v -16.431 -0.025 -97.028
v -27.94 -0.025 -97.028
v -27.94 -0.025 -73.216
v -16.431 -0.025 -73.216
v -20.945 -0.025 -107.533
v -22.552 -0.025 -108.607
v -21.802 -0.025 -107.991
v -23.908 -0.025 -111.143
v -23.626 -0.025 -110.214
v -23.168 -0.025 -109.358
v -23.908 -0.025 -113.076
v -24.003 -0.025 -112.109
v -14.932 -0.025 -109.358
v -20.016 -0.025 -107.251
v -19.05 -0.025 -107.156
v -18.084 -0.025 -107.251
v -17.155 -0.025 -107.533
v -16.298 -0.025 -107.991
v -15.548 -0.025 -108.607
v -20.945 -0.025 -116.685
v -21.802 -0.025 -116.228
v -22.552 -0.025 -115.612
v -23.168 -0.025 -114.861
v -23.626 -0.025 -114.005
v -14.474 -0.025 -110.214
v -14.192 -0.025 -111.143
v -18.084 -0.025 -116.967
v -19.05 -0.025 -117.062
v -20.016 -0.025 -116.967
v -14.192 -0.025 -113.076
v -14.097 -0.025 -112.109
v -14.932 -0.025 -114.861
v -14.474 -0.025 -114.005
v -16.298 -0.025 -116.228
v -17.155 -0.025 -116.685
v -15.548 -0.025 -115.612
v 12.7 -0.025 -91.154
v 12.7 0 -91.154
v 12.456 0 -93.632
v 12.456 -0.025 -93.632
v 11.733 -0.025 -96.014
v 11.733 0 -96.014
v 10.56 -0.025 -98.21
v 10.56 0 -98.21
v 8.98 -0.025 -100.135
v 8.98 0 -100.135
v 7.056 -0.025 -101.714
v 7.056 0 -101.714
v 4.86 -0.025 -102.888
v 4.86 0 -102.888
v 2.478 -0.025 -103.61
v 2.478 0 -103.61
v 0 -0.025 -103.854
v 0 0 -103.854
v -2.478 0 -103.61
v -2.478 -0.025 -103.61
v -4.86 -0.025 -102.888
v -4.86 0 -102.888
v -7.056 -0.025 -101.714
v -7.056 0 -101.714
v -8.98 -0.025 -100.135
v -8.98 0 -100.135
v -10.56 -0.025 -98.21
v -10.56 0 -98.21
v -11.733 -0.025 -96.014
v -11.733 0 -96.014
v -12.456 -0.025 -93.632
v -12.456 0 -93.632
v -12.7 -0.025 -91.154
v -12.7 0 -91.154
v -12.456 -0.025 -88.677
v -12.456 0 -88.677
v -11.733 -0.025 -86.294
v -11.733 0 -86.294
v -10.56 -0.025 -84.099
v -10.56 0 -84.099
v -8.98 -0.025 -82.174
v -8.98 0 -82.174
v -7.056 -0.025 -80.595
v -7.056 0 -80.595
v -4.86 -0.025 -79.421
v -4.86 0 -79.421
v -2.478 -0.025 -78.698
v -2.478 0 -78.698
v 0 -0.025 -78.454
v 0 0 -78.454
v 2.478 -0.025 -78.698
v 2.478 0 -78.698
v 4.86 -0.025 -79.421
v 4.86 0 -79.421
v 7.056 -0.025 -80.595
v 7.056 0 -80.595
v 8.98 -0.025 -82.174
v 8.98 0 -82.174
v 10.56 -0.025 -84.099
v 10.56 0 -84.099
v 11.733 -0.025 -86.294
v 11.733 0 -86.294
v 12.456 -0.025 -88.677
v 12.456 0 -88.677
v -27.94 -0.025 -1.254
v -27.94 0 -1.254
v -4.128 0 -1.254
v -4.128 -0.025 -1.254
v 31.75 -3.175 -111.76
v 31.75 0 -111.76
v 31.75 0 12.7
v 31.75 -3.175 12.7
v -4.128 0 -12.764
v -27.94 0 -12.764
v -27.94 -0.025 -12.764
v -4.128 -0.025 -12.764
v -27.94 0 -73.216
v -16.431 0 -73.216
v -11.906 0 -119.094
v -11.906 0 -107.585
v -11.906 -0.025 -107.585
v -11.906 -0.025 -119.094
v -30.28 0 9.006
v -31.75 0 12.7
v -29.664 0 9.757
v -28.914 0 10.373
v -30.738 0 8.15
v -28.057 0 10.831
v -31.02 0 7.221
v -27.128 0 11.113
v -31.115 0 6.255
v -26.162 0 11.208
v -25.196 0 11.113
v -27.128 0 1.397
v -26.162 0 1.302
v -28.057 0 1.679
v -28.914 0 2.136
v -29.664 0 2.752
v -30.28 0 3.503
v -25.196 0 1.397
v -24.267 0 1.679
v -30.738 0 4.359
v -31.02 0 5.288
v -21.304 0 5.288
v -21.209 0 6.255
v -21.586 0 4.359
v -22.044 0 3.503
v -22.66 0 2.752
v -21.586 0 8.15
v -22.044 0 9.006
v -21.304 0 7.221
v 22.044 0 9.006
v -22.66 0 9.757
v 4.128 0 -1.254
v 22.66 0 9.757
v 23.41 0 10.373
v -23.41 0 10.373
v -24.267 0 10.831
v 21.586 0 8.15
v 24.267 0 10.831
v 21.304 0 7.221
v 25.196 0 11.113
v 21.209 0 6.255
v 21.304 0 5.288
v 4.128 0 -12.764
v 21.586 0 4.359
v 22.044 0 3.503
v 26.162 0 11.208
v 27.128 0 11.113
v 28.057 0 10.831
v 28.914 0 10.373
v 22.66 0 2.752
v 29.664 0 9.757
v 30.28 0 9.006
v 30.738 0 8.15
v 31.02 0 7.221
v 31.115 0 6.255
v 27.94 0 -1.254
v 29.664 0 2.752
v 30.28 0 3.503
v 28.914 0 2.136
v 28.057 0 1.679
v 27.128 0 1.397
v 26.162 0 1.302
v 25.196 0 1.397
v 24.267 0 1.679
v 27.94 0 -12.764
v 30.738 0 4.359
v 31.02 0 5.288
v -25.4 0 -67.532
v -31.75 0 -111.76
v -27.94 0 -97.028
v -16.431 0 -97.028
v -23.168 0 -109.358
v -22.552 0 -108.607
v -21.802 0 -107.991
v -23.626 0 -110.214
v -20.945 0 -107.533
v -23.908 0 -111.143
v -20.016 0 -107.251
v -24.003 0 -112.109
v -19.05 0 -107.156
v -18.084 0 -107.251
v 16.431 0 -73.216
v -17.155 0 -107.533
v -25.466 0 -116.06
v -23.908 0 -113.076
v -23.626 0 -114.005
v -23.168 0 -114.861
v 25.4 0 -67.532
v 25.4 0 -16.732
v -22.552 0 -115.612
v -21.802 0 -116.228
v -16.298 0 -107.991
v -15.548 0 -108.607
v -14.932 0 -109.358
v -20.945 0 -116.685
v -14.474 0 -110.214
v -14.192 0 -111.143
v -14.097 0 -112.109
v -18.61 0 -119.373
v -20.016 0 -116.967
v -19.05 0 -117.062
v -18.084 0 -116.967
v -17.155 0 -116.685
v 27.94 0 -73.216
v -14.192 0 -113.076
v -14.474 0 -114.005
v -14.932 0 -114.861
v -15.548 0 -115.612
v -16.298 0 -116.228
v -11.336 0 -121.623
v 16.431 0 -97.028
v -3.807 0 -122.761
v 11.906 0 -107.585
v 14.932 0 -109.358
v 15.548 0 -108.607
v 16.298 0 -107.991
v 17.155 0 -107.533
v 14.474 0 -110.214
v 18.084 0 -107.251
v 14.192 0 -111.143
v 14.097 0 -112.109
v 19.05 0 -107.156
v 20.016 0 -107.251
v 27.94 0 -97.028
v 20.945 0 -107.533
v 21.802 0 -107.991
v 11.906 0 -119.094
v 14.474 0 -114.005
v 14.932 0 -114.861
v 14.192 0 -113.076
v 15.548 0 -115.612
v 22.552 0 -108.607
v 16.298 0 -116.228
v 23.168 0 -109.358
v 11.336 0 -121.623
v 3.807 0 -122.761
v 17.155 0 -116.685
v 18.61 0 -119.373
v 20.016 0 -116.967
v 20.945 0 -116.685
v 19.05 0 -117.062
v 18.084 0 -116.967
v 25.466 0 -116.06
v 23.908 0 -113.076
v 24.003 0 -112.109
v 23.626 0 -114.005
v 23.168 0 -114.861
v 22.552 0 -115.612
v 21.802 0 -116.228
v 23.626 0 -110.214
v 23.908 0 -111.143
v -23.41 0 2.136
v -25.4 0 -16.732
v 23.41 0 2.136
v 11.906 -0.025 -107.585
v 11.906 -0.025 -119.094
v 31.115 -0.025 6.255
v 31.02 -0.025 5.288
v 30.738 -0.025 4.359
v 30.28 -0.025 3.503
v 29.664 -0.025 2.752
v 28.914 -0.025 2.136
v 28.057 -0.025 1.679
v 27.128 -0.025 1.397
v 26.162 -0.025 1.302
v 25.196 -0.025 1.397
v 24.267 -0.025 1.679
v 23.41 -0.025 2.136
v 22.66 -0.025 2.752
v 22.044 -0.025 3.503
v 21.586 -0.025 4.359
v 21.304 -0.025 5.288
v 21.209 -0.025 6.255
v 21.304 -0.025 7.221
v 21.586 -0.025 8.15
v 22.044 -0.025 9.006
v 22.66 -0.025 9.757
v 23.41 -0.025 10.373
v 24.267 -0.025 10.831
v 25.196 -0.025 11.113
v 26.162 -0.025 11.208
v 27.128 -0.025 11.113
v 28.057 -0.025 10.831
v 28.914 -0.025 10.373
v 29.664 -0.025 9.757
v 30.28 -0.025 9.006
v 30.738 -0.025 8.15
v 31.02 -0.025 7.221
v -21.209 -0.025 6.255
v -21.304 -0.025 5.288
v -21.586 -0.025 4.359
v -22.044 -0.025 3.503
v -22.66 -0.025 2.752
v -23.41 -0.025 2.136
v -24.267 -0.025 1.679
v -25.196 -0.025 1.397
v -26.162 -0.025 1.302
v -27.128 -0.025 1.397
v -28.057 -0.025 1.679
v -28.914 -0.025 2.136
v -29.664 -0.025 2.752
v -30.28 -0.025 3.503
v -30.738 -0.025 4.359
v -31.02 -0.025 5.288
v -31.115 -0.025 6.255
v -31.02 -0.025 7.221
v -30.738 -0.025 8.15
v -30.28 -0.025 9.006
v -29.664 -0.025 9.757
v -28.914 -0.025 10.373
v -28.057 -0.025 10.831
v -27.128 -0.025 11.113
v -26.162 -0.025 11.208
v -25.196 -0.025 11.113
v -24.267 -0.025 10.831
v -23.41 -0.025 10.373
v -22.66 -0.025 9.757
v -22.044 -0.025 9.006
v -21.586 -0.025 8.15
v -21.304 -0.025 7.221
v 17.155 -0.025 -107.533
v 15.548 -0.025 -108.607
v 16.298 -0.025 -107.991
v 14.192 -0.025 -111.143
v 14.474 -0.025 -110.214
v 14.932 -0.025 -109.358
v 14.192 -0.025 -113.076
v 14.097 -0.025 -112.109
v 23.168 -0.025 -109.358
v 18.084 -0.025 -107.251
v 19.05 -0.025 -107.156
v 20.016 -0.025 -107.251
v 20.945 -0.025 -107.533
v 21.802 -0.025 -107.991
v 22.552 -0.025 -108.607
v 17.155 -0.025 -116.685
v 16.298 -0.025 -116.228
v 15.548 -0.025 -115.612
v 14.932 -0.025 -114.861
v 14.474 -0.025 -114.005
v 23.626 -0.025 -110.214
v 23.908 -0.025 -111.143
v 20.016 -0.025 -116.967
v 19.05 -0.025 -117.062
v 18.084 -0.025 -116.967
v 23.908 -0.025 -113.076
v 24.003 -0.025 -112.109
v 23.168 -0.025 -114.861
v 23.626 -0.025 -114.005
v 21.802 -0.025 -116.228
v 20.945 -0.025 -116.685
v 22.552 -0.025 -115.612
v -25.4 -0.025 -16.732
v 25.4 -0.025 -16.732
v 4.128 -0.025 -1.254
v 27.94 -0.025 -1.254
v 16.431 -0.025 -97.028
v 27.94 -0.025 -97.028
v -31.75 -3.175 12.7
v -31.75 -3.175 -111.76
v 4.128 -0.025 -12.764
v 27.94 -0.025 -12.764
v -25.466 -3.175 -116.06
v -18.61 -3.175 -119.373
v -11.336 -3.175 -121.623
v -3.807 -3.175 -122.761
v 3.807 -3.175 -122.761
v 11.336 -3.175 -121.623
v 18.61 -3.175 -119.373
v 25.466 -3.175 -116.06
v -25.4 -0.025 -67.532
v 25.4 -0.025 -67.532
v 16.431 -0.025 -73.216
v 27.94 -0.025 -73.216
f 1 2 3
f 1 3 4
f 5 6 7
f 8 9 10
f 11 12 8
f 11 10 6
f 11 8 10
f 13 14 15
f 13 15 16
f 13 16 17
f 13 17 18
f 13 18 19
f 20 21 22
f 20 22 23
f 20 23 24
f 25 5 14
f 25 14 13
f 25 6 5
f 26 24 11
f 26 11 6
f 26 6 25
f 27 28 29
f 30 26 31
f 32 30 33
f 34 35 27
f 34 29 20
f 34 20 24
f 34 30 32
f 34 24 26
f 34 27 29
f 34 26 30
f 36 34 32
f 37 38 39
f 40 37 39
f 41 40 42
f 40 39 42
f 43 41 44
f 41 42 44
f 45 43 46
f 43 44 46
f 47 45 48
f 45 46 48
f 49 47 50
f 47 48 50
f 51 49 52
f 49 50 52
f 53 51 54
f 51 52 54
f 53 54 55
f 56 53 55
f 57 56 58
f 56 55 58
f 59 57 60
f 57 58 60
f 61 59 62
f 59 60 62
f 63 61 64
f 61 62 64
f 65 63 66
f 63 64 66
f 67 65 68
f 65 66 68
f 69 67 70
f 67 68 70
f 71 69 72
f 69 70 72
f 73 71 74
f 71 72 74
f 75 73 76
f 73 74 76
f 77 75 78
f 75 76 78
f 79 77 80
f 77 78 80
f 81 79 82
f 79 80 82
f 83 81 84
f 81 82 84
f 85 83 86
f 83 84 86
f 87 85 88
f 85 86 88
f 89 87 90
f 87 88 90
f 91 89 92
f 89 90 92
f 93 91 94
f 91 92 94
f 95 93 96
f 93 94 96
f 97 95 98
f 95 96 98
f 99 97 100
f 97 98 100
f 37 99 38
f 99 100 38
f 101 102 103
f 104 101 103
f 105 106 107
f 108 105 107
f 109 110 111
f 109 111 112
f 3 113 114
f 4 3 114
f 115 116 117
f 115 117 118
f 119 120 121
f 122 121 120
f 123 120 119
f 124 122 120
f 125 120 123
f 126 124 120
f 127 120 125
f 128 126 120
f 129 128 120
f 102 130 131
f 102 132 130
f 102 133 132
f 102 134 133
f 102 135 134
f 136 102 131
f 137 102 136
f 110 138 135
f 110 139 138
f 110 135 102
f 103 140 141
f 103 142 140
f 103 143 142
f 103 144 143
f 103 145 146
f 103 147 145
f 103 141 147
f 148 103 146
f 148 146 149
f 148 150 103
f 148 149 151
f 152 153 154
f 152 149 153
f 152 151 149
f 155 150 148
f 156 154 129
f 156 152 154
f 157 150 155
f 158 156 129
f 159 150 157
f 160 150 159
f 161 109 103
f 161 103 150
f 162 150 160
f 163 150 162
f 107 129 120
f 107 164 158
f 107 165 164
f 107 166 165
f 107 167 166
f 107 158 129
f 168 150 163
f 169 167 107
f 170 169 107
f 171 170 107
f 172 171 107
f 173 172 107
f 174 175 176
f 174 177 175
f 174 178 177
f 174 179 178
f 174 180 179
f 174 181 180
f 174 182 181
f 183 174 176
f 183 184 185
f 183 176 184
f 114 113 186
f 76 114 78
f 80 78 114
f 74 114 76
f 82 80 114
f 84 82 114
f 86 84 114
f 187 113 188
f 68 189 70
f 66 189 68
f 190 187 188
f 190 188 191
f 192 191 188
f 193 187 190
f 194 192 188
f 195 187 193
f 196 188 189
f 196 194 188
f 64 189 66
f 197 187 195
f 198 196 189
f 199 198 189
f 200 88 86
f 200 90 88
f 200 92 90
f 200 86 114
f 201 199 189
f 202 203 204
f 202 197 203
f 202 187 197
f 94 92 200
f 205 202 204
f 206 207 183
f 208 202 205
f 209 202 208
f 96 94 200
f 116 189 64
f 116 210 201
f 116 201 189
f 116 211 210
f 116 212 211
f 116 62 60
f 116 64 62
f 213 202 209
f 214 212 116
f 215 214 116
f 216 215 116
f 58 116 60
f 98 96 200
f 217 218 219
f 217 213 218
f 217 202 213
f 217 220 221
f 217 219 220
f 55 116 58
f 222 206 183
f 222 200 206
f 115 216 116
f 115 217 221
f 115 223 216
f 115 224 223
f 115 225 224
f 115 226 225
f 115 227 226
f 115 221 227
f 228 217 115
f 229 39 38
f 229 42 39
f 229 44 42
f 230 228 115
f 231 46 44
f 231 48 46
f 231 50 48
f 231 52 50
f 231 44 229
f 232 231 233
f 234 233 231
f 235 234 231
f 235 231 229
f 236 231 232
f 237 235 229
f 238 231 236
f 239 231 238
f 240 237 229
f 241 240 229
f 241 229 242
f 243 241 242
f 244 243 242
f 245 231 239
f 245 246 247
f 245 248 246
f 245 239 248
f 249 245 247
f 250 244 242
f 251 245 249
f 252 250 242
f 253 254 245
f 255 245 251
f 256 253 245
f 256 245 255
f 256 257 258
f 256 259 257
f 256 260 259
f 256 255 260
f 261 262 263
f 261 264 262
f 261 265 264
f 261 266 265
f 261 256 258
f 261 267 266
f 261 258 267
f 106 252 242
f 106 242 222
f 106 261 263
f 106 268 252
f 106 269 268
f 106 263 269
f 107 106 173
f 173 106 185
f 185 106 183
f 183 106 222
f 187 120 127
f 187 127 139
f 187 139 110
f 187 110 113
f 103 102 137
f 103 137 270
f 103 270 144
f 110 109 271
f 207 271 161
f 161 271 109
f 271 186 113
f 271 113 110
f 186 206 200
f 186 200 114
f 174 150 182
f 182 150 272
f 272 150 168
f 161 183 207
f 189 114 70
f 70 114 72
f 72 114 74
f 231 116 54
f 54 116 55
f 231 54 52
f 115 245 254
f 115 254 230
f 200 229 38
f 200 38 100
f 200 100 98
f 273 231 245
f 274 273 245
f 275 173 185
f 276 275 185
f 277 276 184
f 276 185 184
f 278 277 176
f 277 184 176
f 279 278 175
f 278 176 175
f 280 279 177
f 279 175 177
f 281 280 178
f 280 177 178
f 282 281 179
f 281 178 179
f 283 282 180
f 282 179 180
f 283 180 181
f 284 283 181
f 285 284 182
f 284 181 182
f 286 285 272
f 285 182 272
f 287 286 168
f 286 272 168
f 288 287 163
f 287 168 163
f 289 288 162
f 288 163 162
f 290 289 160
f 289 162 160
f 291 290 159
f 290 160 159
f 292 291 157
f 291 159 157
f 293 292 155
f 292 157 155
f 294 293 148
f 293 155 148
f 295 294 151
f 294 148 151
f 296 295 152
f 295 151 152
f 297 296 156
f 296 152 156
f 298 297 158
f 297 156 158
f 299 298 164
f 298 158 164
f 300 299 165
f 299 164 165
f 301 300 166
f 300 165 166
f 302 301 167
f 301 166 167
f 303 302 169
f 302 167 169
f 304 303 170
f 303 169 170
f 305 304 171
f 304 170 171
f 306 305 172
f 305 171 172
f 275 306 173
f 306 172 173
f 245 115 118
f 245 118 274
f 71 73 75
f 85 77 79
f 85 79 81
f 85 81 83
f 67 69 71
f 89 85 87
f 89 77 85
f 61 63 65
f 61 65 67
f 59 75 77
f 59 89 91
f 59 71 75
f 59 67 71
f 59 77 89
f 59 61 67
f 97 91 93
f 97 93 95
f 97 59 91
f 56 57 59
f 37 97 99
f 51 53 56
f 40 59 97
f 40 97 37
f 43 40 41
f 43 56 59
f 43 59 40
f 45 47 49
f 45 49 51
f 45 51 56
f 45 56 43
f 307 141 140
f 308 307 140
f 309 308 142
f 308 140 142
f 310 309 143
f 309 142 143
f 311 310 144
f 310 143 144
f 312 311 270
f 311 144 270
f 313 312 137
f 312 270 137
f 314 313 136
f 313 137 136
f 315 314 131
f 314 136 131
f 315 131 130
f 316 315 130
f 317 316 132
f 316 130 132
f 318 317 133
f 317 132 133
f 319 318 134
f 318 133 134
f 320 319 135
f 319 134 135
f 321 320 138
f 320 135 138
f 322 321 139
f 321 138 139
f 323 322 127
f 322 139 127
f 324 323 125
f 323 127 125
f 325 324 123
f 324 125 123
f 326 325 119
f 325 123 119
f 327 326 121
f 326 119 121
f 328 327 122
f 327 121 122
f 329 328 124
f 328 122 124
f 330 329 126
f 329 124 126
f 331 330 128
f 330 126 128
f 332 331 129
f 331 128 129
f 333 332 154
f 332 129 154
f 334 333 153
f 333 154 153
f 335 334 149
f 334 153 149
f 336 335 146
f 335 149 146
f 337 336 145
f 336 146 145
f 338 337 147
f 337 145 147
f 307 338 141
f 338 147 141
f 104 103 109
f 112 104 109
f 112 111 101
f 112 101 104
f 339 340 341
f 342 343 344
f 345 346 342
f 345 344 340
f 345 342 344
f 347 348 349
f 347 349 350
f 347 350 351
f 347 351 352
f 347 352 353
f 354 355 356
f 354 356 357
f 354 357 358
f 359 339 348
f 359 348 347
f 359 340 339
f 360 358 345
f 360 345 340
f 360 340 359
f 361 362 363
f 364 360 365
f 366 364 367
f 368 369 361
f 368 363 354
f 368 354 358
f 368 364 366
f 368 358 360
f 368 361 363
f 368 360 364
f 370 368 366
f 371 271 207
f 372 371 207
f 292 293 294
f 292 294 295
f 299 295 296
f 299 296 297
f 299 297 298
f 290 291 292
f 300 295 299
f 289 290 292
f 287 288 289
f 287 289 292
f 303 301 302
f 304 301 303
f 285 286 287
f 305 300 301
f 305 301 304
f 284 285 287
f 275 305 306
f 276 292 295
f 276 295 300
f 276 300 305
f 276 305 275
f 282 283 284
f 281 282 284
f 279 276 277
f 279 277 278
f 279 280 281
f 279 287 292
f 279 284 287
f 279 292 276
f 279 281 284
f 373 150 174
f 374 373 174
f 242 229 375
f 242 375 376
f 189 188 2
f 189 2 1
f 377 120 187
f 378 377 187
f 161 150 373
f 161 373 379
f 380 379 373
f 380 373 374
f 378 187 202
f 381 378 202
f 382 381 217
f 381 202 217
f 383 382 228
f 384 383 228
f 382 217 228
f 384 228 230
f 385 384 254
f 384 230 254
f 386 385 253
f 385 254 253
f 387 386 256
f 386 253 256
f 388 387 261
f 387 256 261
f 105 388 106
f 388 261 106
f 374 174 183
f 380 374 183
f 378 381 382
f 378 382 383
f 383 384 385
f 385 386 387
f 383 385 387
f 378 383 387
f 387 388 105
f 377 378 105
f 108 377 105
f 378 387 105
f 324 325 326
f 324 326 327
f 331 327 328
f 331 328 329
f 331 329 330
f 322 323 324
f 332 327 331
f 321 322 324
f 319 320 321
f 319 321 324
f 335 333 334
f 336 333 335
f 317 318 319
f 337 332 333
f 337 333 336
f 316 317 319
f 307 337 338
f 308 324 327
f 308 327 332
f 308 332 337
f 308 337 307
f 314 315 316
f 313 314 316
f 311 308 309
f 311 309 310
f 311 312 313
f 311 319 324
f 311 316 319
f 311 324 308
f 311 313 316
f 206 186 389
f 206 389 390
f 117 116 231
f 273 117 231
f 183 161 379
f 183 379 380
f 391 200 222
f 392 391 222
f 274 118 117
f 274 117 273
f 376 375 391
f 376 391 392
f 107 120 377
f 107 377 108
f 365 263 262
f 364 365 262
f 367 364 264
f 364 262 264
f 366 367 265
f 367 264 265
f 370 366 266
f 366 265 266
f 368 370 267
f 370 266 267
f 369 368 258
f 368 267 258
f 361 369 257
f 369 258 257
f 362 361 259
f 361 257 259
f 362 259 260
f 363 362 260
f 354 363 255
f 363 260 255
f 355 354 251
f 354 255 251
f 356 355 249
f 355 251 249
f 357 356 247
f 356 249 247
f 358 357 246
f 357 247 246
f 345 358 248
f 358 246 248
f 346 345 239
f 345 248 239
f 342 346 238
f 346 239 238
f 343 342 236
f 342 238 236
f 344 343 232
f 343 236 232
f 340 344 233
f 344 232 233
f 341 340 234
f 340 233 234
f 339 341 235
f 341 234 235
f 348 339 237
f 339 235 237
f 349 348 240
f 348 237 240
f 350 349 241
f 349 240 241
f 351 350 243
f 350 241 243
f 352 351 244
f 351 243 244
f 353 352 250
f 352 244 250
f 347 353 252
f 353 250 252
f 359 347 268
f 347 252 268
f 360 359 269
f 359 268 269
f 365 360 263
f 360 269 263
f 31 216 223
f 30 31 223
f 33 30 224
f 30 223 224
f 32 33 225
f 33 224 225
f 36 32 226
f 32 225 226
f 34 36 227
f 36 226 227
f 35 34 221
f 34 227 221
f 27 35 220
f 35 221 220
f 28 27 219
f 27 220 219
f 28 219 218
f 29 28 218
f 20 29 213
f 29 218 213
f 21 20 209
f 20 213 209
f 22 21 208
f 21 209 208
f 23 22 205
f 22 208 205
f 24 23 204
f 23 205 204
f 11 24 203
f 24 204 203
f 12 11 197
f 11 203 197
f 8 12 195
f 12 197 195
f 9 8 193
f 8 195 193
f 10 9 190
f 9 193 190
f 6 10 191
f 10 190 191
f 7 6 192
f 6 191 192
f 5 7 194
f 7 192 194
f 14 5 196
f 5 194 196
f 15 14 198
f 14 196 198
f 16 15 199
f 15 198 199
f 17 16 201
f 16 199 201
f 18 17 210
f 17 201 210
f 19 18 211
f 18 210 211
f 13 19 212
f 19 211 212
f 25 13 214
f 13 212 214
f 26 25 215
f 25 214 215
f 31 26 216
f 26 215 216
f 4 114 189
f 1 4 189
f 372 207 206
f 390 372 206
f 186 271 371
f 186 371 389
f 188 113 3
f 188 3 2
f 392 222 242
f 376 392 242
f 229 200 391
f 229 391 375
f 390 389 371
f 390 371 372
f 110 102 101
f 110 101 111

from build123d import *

# Parameters (mm, degrees)
BOSS_EXTRUDE1_DEPTH = 12.7
BOSS_EXTRUDE2_DEPTH = 11.43
BOSS_EXTRUDE3_DEPTH = 3.175
SKETCH25_W          = 101.6
SKETCH25_H          = 203.2
CUT_EXTRUDE16_DEPTH = 26.4
SKETCH31_W          = 40.64
SKETCH31_H          = 12.7
BOSS_EXTRUDE5_DEPTH = 3.175
SKETCH27_R          = 4.953
SKETCH27_R_2        = 12.7
SKETCH27_W          = 50.8
SKETCH27_H          = 50.8
CUT_EXTRUDE17_DEPTH = 0.0254
SKETCH28_W          = 23.8125
SKETCH28_H          = 11.509375
SKETCH28_W_2        = 11.509375
SKETCH28_H_2        = 23.8125
CUT_EXTRUDE18_DEPTH = 0.0254


with BuildPart() as part:
    # Sketch1 → Boss-Extrude1 (new body)
    with BuildSketch(Plane(origin=(0, 0, 0), x_dir=(1, 0, 0), z_dir=(0, 1, 0))):
        with BuildLine():
            Line((-31.75, 0), (31.75, 0))
            Line((31.75, 0), (31.75, 111.76))
            ThreePointArc((31.75, 111.76), (0, 122.90426271), (-31.75, 111.76))
            Line((-31.75, 111.76), (-31.75, 0))
        make_face()
    extrude(amount=BOSS_EXTRUDE1_DEPTH)

    # Sketch2 → Boss-Extrude2 (add)
    with BuildSketch(Plane.ZY.offset(31.75)):
        with BuildLine():
            Line((0, 0), (12.7, 0))
            ThreePointArc((12.7, 0), (21.680256121, 21.680256121), (0, 12.7))
            Line((0, 12.7), (0, 0))
        make_face()
    boss_extrude2 = extrude(amount=-BOSS_EXTRUDE2_DEPTH)

    # Mirror1: Boss-Extrude2 across plane
    add(boss_extrude2.mirror(Plane(origin=(0, 0, 0), x_dir=(0, 0, 1), z_dir=(1, 0, 0))))

    # Sketch24 → Boss-Extrude3 (add)
    with BuildSketch(Plane.XZ):
        with BuildLine():
            Line((20.32, 0), (-20.32, 0))
            Line((-20.32, 0), (-20.32, 12.7))
            Line((-20.32, 12.7), (-31.75, 12.7))
            Line((-31.75, 12.7), (-31.75, -111.76))
            ThreePointArc((-31.75, -111.76), (0, -122.90426271), (31.75, -111.76))
            Line((31.75, -111.76), (31.75, 12.7))
            Line((31.75, 12.7), (20.32, 12.7))
            Line((20.32, 12.7), (20.32, 0))
        make_face()
    extrude(amount=BOSS_EXTRUDE3_DEPTH)

    # Sketch25 → Cut-Extrude16 (cut, through all)
    with BuildSketch(Plane(origin=(0, 0, 0), x_dir=(-1, 0, 0), z_dir=(0, -1, 0))):
        with Locations((12.008205385, 70.319547201)):
            Rectangle(SKETCH25_W, SKETCH25_H)
    extrude(amount=-CUT_EXTRUDE16_DEPTH, mode=Mode.SUBTRACT)

    # Sketch31 → Boss-Extrude5 (add)
    with BuildSketch(Plane(origin=(0, 0, 0), x_dir=(1, 0, 0), z_dir=(0, 1, 0))):
        with Locations((0, -6.35)):
            Rectangle(SKETCH31_W, SKETCH31_H)
    extrude(amount=-BOSS_EXTRUDE5_DEPTH)

    # Sketch27 → Cut-Extrude17 (cut)
    with BuildSketch(Plane(origin=(0, 0, 0), x_dir=(1, 0, 0), z_dir=(0, 1, 0))):
        with Locations((19.05, 112.10926271)):
            Circle(SKETCH27_R)
        with Locations((-19.05, 112.10926271)):
            Circle(SKETCH27_R)
        with Locations((26.162, -6.25473729)):
            Circle(SKETCH27_R)
        with Locations((-26.162, -6.25473729)):
            Circle(SKETCH27_R)
        with Locations((0, 91.15426271)):
            Circle(SKETCH27_R_2)
        with Locations((0, 42.13226271)):
            Rectangle(SKETCH27_W, SKETCH27_H)
    extrude(amount=-CUT_EXTRUDE17_DEPTH, mode=Mode.SUBTRACT)

    # Sketch28 → Cut-Extrude18 (cut)
    with BuildSketch(Plane(origin=(0, 0, 0), x_dir=(1, 0, 0), z_dir=(0, 1, 0))):
        with Locations((-16.03375, 7.0088125)):
            Rectangle(SKETCH28_W, SKETCH28_H)
        with Locations((22.1853125, 85.12175)):
            Rectangle(SKETCH28_W_2, SKETCH28_H_2)
        with Locations((16.03375, 7.0088125)):
            Rectangle(SKETCH28_W, SKETCH28_H)
        with Locations((0, 113.33957521)):
            Rectangle(SKETCH28_W, SKETCH28_H)
        with Locations((-22.1853125, 85.12175)):
            Rectangle(SKETCH28_W_2, SKETCH28_H_2)
    extrude(amount=-CUT_EXTRUDE18_DEPTH, mode=Mode.SUBTRACT)


solid = part.part
